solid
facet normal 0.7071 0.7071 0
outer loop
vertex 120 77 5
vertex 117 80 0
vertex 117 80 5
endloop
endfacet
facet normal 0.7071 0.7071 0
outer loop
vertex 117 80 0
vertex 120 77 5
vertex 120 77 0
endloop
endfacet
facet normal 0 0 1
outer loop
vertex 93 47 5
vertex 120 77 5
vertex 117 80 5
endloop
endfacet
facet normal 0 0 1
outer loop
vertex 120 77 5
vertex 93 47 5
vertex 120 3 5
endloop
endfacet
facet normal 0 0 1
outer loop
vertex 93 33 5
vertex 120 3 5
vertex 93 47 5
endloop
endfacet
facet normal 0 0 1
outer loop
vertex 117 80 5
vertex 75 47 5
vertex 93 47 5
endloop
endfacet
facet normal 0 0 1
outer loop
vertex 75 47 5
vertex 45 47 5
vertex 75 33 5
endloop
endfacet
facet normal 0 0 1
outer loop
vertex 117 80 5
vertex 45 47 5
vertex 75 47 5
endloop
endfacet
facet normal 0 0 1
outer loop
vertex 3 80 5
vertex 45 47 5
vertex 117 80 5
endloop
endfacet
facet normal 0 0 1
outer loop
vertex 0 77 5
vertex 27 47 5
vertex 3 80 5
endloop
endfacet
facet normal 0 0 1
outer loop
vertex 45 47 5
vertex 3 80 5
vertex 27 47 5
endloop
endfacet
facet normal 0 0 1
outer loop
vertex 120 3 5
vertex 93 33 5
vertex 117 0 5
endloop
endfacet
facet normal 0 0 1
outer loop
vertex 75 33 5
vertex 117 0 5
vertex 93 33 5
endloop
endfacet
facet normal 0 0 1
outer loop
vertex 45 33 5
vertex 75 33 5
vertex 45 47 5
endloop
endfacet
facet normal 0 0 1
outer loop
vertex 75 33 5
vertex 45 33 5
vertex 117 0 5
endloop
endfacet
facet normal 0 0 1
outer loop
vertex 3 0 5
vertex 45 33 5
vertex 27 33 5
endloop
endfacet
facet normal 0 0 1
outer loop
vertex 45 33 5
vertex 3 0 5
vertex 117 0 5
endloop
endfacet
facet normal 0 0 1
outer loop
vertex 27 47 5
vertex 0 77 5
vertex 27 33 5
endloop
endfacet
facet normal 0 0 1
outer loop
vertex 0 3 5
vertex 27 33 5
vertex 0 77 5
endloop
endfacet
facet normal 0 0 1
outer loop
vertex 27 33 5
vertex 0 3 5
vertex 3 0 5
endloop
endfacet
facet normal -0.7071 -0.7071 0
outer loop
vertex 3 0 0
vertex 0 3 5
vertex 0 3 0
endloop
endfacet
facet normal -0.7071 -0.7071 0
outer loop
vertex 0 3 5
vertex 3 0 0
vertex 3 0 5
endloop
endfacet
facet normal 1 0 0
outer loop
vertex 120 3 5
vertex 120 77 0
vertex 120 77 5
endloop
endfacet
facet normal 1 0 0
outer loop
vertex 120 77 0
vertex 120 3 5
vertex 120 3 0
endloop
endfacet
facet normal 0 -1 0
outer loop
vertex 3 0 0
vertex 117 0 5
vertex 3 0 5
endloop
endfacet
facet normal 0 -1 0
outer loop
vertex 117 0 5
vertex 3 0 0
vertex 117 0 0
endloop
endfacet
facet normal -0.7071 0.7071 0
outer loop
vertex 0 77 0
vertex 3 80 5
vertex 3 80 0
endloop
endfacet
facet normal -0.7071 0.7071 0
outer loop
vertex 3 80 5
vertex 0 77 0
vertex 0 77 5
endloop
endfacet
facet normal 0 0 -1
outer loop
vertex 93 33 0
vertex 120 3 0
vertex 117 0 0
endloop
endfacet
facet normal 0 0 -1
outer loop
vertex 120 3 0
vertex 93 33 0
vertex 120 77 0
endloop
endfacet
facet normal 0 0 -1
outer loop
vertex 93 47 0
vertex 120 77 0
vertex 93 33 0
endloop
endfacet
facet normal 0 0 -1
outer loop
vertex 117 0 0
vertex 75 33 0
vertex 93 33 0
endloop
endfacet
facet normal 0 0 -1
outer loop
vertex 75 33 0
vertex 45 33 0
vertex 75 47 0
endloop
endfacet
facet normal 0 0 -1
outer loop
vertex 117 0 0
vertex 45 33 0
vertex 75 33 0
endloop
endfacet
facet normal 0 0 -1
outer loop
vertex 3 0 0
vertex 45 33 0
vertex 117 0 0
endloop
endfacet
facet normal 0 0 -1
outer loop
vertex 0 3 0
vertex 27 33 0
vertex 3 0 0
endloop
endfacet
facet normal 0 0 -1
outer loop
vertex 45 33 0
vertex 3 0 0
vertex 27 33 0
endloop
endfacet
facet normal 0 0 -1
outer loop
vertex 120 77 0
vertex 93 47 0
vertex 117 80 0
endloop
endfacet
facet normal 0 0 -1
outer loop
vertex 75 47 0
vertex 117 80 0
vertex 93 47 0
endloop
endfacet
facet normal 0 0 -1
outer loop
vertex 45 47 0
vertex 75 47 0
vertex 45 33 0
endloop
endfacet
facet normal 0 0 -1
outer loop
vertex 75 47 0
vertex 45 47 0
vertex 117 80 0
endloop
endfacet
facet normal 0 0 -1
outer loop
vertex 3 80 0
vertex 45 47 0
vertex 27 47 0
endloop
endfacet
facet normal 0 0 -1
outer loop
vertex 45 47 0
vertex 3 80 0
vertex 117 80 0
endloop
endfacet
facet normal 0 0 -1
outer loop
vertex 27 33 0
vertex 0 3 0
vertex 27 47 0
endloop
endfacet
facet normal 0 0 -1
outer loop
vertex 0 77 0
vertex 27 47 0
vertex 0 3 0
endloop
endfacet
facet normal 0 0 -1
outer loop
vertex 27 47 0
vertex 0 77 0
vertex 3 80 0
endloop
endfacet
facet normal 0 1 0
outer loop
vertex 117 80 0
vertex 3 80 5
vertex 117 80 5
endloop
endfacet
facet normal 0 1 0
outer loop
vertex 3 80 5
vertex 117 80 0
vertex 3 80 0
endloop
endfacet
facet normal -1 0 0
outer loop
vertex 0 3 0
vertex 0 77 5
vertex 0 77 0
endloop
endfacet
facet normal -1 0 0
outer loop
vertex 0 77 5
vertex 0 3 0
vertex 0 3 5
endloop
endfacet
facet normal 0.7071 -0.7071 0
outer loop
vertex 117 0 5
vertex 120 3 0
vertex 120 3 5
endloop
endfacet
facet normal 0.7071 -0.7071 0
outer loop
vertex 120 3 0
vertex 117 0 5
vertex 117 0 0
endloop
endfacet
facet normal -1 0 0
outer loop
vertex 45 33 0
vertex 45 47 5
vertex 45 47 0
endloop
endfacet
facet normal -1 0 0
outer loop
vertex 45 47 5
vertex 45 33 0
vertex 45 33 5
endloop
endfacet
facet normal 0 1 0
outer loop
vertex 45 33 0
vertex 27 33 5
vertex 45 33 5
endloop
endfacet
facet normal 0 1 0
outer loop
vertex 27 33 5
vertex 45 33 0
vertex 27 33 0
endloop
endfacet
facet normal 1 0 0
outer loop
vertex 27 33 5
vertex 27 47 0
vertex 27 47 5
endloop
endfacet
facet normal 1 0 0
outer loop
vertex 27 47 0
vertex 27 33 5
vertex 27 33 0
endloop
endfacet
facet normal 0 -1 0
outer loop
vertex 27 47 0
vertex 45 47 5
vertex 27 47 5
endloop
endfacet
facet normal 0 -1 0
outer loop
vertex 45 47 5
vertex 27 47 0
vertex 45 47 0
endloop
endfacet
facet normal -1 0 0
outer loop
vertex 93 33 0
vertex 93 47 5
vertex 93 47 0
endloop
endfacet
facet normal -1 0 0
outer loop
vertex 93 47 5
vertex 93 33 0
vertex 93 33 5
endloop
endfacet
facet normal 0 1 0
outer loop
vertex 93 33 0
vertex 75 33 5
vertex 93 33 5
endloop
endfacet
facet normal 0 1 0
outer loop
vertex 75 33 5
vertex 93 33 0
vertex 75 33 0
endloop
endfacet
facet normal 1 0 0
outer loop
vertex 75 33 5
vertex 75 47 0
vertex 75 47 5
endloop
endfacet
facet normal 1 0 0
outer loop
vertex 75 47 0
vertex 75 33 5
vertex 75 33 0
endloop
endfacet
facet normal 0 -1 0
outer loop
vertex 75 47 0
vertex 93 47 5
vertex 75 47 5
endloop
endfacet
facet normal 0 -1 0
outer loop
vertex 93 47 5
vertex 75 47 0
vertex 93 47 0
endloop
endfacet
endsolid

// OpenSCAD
$fn = 32;

// ----------------------------------------------------------------------
// Windowed plate: 2 voids, 120 x 80 x 5 mm
// ----------------------------------------------------------------------

// --- parameters (mm) ---
plate_l = 120;            // plate length, X
plate_w = 80;             // plate width, Y
plate_t = 5;              // plate thickness, Z
edge_margin = 12;         // wall from the plate edge to any window
windows = 2;              // number of windows in the row
win_l = 18;               // window length
win_w = 14;               // window width
win_pitch = 48;           // window pitch along X
depth_1 = 5;              // depth of void 1 (full thickness = through)
depth_2 = 5;              // depth of void 2 (full thickness = through)
corner_c = 3;             // corner chamfer of the plate
fit_tol = 0.1;            // declared fit tolerance (prompt contract)
free_tol = 0.3;           // declared free tolerance (prompt contract)

profile = [[3, 0], [117, 0], [120, 3], [120, 77], [117, 80], [3, 80], [0, 77], [0, 3]];  // primary outline, 8 points, counter clockwise
void_1 = [[27, 33], [45, 33], [45, 47], [27, 47]];  // window 1 of the row, 4 points
void_2 = [[75, 33], [93, 33], [93, 47], [75, 47]];  // window 2 of the row, 4 points

// --- the one profile operation ---
difference() {
  linear_extrude(height = plate_t) polygon(points = profile);
  translate([0, 0, -1])
    linear_extrude(height = plate_t + 2) polygon(points = void_1);
  translate([0, 0, -1])
    linear_extrude(height = plate_t + 2) polygon(points = void_2);
}
